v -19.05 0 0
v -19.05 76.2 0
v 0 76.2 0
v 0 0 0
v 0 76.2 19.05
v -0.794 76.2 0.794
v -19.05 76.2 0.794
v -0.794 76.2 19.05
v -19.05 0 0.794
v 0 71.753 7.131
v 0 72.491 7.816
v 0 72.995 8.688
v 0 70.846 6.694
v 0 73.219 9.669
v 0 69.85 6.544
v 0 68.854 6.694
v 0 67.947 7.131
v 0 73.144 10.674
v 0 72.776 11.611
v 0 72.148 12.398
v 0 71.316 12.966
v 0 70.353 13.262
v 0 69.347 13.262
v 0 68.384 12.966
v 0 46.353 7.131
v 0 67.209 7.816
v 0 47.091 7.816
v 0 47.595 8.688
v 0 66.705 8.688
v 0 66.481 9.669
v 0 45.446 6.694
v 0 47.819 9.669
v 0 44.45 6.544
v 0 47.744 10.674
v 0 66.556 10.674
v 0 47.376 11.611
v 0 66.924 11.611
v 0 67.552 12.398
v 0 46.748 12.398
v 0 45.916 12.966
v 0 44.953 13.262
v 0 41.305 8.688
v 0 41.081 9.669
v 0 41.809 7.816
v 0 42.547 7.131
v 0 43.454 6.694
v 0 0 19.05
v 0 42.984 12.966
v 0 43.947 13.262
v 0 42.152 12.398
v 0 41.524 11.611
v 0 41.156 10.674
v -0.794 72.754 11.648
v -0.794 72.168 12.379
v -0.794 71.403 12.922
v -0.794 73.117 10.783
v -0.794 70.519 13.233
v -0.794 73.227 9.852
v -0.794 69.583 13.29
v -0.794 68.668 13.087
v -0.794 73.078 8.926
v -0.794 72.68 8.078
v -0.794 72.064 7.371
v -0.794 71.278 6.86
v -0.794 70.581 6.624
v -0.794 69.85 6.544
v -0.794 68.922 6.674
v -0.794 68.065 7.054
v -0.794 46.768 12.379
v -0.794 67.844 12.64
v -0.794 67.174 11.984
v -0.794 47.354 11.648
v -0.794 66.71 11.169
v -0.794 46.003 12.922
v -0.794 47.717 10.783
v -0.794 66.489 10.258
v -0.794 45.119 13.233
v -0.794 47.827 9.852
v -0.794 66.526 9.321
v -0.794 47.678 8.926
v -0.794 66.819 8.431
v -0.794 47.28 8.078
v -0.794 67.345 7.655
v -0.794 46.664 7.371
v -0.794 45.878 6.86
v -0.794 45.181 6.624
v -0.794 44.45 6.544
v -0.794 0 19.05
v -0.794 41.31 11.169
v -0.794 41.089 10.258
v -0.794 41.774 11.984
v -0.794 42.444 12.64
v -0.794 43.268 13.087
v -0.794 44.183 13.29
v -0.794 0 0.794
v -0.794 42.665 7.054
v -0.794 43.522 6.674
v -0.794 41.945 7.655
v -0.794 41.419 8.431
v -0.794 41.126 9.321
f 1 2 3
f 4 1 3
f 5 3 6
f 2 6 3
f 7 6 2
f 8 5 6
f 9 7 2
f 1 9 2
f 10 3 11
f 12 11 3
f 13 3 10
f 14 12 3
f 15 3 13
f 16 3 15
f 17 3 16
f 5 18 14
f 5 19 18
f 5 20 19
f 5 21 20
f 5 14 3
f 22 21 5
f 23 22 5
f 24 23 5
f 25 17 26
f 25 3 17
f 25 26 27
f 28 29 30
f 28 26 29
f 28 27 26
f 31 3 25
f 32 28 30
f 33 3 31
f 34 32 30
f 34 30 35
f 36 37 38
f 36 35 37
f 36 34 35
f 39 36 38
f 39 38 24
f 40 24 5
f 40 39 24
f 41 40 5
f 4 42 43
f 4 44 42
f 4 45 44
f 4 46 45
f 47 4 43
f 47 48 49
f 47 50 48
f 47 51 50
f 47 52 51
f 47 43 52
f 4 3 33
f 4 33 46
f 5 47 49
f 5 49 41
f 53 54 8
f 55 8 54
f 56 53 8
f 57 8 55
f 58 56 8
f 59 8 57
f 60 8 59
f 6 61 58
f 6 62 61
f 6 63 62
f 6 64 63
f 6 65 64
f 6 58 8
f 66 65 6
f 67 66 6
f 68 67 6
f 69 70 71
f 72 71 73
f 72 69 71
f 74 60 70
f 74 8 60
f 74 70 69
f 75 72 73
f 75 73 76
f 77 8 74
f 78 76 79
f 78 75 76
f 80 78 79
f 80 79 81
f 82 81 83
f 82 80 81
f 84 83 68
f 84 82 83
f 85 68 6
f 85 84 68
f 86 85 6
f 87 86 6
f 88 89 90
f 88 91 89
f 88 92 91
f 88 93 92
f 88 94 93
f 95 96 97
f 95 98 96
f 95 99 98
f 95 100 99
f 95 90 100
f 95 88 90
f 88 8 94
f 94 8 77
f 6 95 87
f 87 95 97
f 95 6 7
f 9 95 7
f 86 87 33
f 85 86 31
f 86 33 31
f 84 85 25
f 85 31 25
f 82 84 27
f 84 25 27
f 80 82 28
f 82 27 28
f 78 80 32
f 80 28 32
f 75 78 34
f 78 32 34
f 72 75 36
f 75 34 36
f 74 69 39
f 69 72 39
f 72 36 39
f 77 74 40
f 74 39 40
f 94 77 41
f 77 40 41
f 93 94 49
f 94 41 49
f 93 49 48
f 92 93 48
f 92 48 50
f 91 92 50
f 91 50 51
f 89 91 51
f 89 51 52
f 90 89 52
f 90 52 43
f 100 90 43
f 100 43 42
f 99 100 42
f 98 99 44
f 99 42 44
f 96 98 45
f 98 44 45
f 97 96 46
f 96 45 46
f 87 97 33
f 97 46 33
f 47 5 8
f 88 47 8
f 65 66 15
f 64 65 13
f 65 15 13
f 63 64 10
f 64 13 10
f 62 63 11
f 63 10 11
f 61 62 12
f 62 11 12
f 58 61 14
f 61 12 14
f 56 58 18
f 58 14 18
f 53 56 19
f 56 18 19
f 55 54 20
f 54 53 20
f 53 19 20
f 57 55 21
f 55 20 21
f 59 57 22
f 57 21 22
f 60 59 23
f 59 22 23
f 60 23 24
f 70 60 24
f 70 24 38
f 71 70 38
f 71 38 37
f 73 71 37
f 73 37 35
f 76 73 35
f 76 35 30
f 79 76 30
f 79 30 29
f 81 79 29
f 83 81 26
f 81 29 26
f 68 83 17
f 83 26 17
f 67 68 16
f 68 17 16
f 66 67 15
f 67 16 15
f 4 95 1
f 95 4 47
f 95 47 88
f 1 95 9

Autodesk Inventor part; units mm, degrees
ref_plane "YZ Plane" through (0, 0, 0) normal (1, 0, 0) x (0, 1, 0)
ref_plane "XZ Plane" through (0, 0, 0) normal (0, 1, 0) x (-1, 0, 0)
ref_plane "XY Plane" through (0, 0, 0) normal (0, 0, 1) x (1, 0, 0)
sketch "Sketch1" plane through (0, 0, 0) normal (0, 1, 0) x (-1, 0, 0)
  line L0 (0, 0) -> (0, 19.05)
  line L1 (0, 19.05) -> (0.7937, 19.05)
  line L2 (0.7937, 19.05) -> (0.7938, 0.7937)
  line L3 (0.7938, 0.7937) -> (19.05, 0.7937)
  line L4 (19.05, 0.7937) -> (19.05, 0)
  line L5 (19.05, 0) -> (0, 0)
  dimension "d0" = 19.05
  dimension "d1" = 0.7937
extrude "Extrusion1" add sketch "Sketch1" along normal blind 76.2
sketch "Sketch2" plane through (0, 0, 19.05) normal (1, 0, 0) x (0, 0, -1)
  circle A0 centre (9.1281, 69.85) radius 3.3782
  circle A1 centre (9.1281, 44.45) radius 3.3782
  line L0 (0, 76.2) -> (19.05, 76.2) projected
  line L1 (0, 0) -> (0, 76.2) projected
  line L2 (18.2563, 0) -> (18.2563, 76.2) projected
  line L3 (18.2563, 38.1) -> (0, 38.1) construction
  line L4 (9.1281, 38.1) -> (9.1281, 76.2) construction
  dimension "d5" = 6.7564
  dimension "d18" = 25.4
  dimension "d19" = 6.35
extrude "Extrusion2" cut sketch "Sketch2" against normal through all
properties part number "Shooter Main Gear Guide Bar" material "Aluminum 6061"
